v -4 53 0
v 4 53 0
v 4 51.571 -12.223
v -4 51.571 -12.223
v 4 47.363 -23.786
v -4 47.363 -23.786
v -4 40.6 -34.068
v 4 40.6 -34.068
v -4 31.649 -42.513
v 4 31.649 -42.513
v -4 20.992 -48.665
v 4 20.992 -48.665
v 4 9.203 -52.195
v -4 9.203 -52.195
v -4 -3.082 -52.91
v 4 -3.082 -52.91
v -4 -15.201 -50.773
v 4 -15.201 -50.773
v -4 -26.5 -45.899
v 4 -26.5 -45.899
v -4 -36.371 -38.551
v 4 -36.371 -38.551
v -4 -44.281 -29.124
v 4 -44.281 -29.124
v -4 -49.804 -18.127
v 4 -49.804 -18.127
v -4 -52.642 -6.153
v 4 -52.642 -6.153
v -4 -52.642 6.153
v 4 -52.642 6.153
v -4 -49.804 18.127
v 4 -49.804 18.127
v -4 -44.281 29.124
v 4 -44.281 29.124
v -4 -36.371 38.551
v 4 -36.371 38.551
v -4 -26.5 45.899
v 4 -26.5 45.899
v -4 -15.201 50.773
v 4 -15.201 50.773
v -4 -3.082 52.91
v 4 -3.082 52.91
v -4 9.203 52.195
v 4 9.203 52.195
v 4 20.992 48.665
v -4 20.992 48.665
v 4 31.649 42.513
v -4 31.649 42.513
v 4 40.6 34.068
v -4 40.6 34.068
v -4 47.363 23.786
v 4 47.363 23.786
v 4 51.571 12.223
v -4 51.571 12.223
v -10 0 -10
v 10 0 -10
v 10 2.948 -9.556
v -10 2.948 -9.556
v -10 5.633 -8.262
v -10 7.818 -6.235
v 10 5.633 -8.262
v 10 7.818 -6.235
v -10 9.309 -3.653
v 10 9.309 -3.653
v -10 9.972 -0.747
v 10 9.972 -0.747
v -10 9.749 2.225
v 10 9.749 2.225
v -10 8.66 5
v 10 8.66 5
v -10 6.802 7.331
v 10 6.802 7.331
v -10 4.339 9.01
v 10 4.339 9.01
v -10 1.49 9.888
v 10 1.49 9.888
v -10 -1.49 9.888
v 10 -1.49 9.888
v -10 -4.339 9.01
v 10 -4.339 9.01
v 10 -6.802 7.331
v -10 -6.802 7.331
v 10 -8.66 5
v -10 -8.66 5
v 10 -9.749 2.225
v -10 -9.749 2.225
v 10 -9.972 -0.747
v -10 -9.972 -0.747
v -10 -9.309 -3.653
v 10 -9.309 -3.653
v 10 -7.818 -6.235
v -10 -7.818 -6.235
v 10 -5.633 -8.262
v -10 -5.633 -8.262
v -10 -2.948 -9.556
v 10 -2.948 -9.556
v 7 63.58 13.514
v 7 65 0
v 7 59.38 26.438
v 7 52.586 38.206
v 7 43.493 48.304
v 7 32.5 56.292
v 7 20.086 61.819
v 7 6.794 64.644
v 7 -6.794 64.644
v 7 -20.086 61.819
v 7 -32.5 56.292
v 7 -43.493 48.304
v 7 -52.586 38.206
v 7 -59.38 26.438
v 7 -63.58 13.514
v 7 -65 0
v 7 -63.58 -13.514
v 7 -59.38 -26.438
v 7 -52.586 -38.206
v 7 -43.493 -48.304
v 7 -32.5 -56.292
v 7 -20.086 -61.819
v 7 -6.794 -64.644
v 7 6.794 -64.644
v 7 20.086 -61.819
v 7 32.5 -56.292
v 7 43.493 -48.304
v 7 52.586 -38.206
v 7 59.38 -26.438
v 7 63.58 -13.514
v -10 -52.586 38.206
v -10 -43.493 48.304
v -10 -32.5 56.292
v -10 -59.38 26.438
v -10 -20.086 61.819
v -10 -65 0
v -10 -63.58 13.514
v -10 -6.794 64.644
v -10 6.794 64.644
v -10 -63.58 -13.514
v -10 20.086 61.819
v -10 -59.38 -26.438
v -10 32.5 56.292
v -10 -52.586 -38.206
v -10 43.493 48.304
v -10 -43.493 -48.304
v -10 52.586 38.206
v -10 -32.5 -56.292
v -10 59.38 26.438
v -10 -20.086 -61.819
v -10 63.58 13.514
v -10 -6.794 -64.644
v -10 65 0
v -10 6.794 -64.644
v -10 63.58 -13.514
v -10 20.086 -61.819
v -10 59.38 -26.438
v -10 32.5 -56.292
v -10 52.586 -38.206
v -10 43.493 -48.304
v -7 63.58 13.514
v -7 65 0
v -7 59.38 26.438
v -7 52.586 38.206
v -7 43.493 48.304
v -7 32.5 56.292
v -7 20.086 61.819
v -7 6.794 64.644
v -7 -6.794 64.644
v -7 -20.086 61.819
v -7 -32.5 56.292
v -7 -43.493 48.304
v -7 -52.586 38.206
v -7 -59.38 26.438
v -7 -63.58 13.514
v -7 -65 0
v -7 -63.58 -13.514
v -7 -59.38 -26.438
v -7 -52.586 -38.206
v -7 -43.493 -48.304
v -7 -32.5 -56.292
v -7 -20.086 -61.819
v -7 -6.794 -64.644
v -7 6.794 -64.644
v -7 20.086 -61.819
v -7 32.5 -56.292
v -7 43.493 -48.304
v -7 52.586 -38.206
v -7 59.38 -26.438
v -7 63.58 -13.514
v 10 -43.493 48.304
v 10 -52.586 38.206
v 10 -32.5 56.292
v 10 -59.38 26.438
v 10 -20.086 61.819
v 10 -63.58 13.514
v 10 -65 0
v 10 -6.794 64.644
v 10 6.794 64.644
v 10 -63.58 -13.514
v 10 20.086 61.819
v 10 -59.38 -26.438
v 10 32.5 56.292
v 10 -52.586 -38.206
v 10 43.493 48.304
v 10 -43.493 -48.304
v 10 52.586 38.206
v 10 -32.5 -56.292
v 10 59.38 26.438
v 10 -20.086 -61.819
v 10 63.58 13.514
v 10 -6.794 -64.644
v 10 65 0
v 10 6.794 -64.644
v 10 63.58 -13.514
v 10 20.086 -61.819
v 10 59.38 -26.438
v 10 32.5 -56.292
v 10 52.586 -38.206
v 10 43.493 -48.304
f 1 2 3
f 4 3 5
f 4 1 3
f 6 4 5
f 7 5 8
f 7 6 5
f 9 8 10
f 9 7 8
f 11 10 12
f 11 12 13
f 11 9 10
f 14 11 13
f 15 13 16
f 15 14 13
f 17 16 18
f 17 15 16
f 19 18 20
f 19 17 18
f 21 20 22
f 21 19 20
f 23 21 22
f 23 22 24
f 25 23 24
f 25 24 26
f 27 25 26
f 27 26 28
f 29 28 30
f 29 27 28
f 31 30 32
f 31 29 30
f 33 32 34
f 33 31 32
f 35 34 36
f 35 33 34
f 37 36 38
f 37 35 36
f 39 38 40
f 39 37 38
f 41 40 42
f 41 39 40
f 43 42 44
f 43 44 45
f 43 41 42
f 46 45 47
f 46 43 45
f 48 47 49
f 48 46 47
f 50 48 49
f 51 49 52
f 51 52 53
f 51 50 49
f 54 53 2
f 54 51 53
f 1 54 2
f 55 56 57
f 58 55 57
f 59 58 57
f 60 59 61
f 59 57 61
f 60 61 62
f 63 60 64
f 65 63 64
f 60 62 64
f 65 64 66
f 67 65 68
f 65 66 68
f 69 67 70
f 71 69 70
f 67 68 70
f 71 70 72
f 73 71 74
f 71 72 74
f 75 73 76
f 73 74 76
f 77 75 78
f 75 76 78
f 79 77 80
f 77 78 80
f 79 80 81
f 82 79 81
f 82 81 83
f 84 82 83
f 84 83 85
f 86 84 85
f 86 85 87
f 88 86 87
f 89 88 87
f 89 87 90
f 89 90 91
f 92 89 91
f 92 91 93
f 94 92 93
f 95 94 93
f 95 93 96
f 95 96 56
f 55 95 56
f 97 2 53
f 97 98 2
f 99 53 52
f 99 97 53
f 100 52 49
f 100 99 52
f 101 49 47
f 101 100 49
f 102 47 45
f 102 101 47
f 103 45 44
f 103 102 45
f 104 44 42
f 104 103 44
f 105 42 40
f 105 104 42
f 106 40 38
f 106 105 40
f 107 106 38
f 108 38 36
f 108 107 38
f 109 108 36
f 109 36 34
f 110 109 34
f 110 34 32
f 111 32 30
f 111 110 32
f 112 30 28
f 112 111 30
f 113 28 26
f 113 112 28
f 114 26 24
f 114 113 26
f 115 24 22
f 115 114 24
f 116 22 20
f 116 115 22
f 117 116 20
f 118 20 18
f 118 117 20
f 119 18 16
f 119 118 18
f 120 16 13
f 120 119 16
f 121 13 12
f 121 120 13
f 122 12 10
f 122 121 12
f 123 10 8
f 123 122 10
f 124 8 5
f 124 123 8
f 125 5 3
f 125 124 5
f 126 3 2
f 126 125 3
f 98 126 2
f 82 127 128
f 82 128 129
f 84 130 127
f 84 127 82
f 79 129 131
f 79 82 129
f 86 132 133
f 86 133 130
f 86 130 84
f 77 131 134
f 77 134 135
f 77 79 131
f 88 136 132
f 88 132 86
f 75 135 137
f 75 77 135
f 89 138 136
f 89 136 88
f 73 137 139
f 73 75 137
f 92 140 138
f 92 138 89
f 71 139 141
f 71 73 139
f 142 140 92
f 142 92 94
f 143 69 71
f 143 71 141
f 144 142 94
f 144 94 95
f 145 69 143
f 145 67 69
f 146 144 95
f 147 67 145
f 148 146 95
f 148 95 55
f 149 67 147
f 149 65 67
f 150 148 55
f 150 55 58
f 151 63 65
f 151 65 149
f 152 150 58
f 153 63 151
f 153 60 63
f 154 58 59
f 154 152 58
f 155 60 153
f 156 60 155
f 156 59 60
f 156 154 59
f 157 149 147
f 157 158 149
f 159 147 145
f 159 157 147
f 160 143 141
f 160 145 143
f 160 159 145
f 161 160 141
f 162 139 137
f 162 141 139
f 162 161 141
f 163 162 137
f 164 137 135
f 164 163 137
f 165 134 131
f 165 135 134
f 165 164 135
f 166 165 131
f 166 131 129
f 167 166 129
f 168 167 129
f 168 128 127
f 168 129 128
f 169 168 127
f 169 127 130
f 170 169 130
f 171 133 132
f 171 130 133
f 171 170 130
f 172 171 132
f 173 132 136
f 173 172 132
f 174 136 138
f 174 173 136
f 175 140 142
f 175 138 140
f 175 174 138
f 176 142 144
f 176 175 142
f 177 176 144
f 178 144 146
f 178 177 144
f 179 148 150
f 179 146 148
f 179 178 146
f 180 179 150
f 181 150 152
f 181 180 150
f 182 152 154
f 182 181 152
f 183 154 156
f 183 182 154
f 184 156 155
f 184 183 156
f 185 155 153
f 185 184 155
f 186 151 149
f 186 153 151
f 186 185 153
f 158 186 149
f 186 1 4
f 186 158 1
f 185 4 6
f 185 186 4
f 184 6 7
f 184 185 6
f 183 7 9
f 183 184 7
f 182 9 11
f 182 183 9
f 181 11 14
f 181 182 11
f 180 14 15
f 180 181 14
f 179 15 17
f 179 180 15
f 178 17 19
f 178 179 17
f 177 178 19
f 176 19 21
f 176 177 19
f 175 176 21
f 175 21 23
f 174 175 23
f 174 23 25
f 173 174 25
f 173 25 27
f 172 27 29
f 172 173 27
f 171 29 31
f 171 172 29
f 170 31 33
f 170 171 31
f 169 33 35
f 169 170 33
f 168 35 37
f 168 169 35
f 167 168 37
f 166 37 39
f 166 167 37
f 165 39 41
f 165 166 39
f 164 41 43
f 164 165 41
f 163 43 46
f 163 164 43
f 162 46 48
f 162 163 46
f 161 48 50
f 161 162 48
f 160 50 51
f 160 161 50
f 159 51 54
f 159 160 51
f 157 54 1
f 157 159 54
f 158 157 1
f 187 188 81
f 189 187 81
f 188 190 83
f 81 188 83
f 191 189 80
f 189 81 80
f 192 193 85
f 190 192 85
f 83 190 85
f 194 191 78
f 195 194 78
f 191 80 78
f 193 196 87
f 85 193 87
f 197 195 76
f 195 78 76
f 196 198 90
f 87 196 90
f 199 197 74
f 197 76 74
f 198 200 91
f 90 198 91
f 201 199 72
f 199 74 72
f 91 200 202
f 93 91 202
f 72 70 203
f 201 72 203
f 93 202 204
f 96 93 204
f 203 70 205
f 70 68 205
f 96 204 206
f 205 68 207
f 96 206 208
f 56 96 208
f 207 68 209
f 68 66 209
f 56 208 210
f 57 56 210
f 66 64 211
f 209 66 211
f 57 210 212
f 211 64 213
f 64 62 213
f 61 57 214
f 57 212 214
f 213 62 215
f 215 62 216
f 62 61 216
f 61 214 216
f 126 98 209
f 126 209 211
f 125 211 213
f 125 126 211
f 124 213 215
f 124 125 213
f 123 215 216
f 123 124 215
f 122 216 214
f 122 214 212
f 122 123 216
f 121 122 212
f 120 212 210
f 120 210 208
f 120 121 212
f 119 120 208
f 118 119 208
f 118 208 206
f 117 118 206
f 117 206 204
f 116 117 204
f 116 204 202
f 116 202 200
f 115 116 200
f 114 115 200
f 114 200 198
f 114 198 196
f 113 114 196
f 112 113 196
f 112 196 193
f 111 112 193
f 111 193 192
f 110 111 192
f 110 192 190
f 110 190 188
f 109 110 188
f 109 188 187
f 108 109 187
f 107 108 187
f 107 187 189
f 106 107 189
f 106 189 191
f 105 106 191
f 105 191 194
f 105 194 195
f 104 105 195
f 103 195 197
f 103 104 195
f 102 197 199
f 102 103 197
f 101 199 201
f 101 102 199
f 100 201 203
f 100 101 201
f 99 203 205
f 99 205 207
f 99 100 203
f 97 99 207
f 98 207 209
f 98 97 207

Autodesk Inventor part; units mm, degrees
ref_plane "YZ Plane" through (0, 0, 0) normal (1, 0, 0) x (0, 1, 0)
ref_plane "XZ Plane" through (0, 0, 0) normal (0, 1, 0) x (-1, 0, 0)
ref_plane "XY Plane" through (0, 0, 0) normal (0, 0, 1) x (1, 0, 0)
sketch "Szkic1" plane through (0, 0, 0) normal (0, 0, 1) x (1, 0, 0)
  line L0 (0, 0) -> (10, 0)
  line L1 (10, 0) -> (-10, 0)
  line L2 (-10, 0) -> (-10, 65)
  line L3 (10, 0) -> (10, 65)
  line L4 (-10, 65) -> (-10, 53)
  line L5 (10, 65) -> (7, 65)
  line L6 (-10, 65) -> (-7, 65)
  line L7 (4, 53) -> (-4, 53)
  line L8 (-7, 65) -> (-4, 53)
  line L9 (4, 53) -> (7, 65)
  point P0 (2, 53)
  dimension "d2" = 65
  dimension "d4" = 12
  dimension "d5" = 6
  dimension "d17" = 3
  dimension "d18" = 3
revolve "Obrót1" add sketch "Szkic1" angle 360 about axis through (10, 0, 0) along (-1, 0, 0)
sketch "Szkic2" plane through (10, 0, 0) normal (1, 0, 0) x (0, 0, -1)
  circle A0 centre (0, 0) radius 10
  dimension "d8" = 20
extrude "Wyciągnięcie proste1" cut sketch "Szkic2" against normal blind 100
properties part number "kolo"
